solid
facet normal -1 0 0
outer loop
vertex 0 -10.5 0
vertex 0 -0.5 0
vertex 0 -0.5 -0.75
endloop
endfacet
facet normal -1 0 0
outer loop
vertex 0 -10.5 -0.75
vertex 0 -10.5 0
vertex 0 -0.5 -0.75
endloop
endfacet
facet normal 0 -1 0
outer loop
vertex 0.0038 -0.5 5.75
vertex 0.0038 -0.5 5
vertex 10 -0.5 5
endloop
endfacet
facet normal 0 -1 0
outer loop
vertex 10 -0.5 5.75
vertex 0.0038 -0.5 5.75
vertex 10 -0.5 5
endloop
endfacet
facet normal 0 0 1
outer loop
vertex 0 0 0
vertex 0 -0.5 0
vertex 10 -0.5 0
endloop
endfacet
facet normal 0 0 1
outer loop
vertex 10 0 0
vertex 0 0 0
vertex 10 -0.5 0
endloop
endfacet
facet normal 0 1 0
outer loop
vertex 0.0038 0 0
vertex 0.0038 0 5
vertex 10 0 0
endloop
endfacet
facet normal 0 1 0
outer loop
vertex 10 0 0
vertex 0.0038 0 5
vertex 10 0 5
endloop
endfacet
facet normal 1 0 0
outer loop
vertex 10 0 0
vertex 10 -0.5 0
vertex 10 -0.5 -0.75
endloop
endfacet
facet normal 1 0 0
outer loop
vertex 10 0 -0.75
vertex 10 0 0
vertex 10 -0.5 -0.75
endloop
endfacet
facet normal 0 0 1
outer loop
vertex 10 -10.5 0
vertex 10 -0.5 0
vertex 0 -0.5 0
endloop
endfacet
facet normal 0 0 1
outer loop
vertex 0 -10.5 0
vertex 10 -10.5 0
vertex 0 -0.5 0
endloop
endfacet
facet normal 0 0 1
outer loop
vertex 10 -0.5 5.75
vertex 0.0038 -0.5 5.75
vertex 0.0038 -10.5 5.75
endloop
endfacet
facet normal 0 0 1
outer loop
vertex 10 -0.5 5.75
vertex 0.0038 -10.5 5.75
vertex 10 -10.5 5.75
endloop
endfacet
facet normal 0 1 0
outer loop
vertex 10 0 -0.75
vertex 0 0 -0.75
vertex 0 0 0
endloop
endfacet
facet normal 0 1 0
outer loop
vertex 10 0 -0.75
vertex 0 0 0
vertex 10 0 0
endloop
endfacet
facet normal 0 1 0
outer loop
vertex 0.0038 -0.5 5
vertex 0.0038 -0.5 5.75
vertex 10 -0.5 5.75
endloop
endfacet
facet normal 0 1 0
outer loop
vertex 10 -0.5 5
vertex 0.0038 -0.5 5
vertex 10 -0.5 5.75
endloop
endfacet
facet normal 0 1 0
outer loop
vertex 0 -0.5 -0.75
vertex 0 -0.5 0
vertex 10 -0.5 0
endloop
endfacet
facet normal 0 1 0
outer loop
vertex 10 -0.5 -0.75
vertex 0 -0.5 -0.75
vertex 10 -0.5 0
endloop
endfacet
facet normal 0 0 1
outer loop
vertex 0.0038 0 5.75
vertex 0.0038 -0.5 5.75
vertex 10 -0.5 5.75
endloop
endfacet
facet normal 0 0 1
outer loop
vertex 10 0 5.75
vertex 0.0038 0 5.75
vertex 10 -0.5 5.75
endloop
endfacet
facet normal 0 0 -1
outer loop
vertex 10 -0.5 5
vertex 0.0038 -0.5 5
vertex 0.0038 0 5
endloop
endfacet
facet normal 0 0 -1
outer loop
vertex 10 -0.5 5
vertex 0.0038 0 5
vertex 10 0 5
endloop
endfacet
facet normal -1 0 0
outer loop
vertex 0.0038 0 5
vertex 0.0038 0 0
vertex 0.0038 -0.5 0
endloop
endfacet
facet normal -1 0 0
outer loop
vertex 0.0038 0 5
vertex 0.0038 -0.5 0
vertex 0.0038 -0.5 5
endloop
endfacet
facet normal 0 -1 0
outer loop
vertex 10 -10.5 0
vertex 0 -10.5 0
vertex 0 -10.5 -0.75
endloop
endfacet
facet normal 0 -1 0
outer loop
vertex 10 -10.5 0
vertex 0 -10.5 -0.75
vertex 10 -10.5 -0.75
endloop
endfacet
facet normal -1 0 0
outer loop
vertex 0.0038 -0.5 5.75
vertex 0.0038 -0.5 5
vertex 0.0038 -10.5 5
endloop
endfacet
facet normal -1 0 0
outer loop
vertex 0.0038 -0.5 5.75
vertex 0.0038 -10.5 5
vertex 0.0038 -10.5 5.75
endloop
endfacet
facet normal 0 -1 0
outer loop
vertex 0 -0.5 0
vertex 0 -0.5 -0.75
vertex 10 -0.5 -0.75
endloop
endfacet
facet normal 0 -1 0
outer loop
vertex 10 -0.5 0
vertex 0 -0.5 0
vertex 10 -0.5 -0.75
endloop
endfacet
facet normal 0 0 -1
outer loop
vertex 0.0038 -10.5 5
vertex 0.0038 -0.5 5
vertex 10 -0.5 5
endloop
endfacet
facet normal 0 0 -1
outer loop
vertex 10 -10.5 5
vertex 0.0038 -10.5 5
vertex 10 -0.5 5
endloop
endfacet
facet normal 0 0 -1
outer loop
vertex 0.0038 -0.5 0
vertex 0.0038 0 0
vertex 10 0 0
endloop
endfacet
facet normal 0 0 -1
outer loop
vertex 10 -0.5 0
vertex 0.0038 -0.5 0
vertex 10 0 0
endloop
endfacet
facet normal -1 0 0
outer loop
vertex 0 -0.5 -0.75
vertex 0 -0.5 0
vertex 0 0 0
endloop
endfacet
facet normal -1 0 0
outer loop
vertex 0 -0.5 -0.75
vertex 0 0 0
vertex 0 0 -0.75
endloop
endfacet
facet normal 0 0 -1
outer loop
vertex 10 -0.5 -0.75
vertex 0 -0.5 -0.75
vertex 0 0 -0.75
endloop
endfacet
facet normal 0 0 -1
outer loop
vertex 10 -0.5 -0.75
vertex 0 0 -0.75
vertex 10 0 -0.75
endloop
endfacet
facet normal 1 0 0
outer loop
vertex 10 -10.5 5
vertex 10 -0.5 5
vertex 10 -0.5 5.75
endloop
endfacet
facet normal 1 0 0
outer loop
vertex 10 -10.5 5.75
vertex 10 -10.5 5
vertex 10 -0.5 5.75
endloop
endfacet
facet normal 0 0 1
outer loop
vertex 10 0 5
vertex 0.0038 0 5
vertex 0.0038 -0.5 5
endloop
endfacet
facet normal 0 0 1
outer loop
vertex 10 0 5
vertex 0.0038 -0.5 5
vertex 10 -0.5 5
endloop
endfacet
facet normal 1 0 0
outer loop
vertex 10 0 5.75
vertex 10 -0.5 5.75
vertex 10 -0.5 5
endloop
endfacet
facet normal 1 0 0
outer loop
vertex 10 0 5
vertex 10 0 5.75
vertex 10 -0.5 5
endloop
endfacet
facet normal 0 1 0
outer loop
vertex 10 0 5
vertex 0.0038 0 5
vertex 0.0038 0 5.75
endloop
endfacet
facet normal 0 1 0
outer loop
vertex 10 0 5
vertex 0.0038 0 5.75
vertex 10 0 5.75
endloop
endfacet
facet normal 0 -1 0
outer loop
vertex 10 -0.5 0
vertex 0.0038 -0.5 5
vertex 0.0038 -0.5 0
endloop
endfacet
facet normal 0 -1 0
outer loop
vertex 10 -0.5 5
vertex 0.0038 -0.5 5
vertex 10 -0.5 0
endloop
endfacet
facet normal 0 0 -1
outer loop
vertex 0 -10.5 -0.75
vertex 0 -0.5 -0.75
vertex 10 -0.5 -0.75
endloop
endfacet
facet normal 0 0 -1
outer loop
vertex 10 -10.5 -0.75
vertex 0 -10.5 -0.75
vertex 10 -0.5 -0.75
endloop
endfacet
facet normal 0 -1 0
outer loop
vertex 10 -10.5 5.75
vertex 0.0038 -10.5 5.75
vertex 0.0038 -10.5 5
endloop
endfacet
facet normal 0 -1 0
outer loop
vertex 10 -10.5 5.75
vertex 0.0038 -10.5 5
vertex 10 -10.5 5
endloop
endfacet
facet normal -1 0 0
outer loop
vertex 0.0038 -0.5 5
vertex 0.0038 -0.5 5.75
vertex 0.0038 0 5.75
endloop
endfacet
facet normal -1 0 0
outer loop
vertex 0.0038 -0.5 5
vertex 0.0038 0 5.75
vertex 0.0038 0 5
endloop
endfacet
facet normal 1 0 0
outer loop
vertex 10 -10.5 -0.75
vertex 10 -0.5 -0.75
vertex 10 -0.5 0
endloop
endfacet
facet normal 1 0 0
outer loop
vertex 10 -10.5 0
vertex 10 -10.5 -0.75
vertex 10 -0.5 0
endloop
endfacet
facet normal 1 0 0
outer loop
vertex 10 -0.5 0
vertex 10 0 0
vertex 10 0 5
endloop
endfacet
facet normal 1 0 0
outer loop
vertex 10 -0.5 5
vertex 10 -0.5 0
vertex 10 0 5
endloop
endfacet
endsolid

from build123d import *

# Parameters (mm, degrees)
F0_W        = 9.99621
F0_H        = 5
F1_DEPTH    = 0.5
F2_W        = 9.99621
F2_H        = 0.75
F4_DEPTH    = 10
F4_FACE_W   = 9.99621
F4_FACE_H   = 0.75
F4_FACE_W_2 = 10
F5_DEPTH    = 0.5


with BuildPart() as f1:
    # F0 (on Front) → F1 (new body)
    with BuildSketch(Plane.XZ):
        with Locations((5.001895, 2.5)):
            Rectangle(F0_W, F0_H)
    extrude(amount=F1_DEPTH)


with BuildPart() as f4:
    # F2 (on face) + F3 (on face) → F4 (new body)
    with BuildSketch(Plane.XZ.offset(0.5)):
        with Locations((5.001895, 5.375)):
            Rectangle(F2_W, F2_H)
    with BuildSketch(Plane.XZ.offset(0.5)):
        Polygon((0.00379, 0), (0, 0), (0, -0.75), (10, -0.75), (10, 0), align=None)
    extrude(amount=F4_DEPTH)


with BuildPart() as f5:
    # F4_face (on face) → F5 (new body)
    with BuildSketch(Plane(origin=(5.001895, -0.5, 5.375), x_dir=(1, 0, 0), z_dir=(0, 1, 0))):
        Rectangle(F4_FACE_W, F4_FACE_H)
        with Locations((-0.001895, 5.75)):
            Rectangle(F4_FACE_W_2, F4_FACE_H)
    extrude(amount=F5_DEPTH)


solid = Compound([f1.part, f4.part, f5.part])
